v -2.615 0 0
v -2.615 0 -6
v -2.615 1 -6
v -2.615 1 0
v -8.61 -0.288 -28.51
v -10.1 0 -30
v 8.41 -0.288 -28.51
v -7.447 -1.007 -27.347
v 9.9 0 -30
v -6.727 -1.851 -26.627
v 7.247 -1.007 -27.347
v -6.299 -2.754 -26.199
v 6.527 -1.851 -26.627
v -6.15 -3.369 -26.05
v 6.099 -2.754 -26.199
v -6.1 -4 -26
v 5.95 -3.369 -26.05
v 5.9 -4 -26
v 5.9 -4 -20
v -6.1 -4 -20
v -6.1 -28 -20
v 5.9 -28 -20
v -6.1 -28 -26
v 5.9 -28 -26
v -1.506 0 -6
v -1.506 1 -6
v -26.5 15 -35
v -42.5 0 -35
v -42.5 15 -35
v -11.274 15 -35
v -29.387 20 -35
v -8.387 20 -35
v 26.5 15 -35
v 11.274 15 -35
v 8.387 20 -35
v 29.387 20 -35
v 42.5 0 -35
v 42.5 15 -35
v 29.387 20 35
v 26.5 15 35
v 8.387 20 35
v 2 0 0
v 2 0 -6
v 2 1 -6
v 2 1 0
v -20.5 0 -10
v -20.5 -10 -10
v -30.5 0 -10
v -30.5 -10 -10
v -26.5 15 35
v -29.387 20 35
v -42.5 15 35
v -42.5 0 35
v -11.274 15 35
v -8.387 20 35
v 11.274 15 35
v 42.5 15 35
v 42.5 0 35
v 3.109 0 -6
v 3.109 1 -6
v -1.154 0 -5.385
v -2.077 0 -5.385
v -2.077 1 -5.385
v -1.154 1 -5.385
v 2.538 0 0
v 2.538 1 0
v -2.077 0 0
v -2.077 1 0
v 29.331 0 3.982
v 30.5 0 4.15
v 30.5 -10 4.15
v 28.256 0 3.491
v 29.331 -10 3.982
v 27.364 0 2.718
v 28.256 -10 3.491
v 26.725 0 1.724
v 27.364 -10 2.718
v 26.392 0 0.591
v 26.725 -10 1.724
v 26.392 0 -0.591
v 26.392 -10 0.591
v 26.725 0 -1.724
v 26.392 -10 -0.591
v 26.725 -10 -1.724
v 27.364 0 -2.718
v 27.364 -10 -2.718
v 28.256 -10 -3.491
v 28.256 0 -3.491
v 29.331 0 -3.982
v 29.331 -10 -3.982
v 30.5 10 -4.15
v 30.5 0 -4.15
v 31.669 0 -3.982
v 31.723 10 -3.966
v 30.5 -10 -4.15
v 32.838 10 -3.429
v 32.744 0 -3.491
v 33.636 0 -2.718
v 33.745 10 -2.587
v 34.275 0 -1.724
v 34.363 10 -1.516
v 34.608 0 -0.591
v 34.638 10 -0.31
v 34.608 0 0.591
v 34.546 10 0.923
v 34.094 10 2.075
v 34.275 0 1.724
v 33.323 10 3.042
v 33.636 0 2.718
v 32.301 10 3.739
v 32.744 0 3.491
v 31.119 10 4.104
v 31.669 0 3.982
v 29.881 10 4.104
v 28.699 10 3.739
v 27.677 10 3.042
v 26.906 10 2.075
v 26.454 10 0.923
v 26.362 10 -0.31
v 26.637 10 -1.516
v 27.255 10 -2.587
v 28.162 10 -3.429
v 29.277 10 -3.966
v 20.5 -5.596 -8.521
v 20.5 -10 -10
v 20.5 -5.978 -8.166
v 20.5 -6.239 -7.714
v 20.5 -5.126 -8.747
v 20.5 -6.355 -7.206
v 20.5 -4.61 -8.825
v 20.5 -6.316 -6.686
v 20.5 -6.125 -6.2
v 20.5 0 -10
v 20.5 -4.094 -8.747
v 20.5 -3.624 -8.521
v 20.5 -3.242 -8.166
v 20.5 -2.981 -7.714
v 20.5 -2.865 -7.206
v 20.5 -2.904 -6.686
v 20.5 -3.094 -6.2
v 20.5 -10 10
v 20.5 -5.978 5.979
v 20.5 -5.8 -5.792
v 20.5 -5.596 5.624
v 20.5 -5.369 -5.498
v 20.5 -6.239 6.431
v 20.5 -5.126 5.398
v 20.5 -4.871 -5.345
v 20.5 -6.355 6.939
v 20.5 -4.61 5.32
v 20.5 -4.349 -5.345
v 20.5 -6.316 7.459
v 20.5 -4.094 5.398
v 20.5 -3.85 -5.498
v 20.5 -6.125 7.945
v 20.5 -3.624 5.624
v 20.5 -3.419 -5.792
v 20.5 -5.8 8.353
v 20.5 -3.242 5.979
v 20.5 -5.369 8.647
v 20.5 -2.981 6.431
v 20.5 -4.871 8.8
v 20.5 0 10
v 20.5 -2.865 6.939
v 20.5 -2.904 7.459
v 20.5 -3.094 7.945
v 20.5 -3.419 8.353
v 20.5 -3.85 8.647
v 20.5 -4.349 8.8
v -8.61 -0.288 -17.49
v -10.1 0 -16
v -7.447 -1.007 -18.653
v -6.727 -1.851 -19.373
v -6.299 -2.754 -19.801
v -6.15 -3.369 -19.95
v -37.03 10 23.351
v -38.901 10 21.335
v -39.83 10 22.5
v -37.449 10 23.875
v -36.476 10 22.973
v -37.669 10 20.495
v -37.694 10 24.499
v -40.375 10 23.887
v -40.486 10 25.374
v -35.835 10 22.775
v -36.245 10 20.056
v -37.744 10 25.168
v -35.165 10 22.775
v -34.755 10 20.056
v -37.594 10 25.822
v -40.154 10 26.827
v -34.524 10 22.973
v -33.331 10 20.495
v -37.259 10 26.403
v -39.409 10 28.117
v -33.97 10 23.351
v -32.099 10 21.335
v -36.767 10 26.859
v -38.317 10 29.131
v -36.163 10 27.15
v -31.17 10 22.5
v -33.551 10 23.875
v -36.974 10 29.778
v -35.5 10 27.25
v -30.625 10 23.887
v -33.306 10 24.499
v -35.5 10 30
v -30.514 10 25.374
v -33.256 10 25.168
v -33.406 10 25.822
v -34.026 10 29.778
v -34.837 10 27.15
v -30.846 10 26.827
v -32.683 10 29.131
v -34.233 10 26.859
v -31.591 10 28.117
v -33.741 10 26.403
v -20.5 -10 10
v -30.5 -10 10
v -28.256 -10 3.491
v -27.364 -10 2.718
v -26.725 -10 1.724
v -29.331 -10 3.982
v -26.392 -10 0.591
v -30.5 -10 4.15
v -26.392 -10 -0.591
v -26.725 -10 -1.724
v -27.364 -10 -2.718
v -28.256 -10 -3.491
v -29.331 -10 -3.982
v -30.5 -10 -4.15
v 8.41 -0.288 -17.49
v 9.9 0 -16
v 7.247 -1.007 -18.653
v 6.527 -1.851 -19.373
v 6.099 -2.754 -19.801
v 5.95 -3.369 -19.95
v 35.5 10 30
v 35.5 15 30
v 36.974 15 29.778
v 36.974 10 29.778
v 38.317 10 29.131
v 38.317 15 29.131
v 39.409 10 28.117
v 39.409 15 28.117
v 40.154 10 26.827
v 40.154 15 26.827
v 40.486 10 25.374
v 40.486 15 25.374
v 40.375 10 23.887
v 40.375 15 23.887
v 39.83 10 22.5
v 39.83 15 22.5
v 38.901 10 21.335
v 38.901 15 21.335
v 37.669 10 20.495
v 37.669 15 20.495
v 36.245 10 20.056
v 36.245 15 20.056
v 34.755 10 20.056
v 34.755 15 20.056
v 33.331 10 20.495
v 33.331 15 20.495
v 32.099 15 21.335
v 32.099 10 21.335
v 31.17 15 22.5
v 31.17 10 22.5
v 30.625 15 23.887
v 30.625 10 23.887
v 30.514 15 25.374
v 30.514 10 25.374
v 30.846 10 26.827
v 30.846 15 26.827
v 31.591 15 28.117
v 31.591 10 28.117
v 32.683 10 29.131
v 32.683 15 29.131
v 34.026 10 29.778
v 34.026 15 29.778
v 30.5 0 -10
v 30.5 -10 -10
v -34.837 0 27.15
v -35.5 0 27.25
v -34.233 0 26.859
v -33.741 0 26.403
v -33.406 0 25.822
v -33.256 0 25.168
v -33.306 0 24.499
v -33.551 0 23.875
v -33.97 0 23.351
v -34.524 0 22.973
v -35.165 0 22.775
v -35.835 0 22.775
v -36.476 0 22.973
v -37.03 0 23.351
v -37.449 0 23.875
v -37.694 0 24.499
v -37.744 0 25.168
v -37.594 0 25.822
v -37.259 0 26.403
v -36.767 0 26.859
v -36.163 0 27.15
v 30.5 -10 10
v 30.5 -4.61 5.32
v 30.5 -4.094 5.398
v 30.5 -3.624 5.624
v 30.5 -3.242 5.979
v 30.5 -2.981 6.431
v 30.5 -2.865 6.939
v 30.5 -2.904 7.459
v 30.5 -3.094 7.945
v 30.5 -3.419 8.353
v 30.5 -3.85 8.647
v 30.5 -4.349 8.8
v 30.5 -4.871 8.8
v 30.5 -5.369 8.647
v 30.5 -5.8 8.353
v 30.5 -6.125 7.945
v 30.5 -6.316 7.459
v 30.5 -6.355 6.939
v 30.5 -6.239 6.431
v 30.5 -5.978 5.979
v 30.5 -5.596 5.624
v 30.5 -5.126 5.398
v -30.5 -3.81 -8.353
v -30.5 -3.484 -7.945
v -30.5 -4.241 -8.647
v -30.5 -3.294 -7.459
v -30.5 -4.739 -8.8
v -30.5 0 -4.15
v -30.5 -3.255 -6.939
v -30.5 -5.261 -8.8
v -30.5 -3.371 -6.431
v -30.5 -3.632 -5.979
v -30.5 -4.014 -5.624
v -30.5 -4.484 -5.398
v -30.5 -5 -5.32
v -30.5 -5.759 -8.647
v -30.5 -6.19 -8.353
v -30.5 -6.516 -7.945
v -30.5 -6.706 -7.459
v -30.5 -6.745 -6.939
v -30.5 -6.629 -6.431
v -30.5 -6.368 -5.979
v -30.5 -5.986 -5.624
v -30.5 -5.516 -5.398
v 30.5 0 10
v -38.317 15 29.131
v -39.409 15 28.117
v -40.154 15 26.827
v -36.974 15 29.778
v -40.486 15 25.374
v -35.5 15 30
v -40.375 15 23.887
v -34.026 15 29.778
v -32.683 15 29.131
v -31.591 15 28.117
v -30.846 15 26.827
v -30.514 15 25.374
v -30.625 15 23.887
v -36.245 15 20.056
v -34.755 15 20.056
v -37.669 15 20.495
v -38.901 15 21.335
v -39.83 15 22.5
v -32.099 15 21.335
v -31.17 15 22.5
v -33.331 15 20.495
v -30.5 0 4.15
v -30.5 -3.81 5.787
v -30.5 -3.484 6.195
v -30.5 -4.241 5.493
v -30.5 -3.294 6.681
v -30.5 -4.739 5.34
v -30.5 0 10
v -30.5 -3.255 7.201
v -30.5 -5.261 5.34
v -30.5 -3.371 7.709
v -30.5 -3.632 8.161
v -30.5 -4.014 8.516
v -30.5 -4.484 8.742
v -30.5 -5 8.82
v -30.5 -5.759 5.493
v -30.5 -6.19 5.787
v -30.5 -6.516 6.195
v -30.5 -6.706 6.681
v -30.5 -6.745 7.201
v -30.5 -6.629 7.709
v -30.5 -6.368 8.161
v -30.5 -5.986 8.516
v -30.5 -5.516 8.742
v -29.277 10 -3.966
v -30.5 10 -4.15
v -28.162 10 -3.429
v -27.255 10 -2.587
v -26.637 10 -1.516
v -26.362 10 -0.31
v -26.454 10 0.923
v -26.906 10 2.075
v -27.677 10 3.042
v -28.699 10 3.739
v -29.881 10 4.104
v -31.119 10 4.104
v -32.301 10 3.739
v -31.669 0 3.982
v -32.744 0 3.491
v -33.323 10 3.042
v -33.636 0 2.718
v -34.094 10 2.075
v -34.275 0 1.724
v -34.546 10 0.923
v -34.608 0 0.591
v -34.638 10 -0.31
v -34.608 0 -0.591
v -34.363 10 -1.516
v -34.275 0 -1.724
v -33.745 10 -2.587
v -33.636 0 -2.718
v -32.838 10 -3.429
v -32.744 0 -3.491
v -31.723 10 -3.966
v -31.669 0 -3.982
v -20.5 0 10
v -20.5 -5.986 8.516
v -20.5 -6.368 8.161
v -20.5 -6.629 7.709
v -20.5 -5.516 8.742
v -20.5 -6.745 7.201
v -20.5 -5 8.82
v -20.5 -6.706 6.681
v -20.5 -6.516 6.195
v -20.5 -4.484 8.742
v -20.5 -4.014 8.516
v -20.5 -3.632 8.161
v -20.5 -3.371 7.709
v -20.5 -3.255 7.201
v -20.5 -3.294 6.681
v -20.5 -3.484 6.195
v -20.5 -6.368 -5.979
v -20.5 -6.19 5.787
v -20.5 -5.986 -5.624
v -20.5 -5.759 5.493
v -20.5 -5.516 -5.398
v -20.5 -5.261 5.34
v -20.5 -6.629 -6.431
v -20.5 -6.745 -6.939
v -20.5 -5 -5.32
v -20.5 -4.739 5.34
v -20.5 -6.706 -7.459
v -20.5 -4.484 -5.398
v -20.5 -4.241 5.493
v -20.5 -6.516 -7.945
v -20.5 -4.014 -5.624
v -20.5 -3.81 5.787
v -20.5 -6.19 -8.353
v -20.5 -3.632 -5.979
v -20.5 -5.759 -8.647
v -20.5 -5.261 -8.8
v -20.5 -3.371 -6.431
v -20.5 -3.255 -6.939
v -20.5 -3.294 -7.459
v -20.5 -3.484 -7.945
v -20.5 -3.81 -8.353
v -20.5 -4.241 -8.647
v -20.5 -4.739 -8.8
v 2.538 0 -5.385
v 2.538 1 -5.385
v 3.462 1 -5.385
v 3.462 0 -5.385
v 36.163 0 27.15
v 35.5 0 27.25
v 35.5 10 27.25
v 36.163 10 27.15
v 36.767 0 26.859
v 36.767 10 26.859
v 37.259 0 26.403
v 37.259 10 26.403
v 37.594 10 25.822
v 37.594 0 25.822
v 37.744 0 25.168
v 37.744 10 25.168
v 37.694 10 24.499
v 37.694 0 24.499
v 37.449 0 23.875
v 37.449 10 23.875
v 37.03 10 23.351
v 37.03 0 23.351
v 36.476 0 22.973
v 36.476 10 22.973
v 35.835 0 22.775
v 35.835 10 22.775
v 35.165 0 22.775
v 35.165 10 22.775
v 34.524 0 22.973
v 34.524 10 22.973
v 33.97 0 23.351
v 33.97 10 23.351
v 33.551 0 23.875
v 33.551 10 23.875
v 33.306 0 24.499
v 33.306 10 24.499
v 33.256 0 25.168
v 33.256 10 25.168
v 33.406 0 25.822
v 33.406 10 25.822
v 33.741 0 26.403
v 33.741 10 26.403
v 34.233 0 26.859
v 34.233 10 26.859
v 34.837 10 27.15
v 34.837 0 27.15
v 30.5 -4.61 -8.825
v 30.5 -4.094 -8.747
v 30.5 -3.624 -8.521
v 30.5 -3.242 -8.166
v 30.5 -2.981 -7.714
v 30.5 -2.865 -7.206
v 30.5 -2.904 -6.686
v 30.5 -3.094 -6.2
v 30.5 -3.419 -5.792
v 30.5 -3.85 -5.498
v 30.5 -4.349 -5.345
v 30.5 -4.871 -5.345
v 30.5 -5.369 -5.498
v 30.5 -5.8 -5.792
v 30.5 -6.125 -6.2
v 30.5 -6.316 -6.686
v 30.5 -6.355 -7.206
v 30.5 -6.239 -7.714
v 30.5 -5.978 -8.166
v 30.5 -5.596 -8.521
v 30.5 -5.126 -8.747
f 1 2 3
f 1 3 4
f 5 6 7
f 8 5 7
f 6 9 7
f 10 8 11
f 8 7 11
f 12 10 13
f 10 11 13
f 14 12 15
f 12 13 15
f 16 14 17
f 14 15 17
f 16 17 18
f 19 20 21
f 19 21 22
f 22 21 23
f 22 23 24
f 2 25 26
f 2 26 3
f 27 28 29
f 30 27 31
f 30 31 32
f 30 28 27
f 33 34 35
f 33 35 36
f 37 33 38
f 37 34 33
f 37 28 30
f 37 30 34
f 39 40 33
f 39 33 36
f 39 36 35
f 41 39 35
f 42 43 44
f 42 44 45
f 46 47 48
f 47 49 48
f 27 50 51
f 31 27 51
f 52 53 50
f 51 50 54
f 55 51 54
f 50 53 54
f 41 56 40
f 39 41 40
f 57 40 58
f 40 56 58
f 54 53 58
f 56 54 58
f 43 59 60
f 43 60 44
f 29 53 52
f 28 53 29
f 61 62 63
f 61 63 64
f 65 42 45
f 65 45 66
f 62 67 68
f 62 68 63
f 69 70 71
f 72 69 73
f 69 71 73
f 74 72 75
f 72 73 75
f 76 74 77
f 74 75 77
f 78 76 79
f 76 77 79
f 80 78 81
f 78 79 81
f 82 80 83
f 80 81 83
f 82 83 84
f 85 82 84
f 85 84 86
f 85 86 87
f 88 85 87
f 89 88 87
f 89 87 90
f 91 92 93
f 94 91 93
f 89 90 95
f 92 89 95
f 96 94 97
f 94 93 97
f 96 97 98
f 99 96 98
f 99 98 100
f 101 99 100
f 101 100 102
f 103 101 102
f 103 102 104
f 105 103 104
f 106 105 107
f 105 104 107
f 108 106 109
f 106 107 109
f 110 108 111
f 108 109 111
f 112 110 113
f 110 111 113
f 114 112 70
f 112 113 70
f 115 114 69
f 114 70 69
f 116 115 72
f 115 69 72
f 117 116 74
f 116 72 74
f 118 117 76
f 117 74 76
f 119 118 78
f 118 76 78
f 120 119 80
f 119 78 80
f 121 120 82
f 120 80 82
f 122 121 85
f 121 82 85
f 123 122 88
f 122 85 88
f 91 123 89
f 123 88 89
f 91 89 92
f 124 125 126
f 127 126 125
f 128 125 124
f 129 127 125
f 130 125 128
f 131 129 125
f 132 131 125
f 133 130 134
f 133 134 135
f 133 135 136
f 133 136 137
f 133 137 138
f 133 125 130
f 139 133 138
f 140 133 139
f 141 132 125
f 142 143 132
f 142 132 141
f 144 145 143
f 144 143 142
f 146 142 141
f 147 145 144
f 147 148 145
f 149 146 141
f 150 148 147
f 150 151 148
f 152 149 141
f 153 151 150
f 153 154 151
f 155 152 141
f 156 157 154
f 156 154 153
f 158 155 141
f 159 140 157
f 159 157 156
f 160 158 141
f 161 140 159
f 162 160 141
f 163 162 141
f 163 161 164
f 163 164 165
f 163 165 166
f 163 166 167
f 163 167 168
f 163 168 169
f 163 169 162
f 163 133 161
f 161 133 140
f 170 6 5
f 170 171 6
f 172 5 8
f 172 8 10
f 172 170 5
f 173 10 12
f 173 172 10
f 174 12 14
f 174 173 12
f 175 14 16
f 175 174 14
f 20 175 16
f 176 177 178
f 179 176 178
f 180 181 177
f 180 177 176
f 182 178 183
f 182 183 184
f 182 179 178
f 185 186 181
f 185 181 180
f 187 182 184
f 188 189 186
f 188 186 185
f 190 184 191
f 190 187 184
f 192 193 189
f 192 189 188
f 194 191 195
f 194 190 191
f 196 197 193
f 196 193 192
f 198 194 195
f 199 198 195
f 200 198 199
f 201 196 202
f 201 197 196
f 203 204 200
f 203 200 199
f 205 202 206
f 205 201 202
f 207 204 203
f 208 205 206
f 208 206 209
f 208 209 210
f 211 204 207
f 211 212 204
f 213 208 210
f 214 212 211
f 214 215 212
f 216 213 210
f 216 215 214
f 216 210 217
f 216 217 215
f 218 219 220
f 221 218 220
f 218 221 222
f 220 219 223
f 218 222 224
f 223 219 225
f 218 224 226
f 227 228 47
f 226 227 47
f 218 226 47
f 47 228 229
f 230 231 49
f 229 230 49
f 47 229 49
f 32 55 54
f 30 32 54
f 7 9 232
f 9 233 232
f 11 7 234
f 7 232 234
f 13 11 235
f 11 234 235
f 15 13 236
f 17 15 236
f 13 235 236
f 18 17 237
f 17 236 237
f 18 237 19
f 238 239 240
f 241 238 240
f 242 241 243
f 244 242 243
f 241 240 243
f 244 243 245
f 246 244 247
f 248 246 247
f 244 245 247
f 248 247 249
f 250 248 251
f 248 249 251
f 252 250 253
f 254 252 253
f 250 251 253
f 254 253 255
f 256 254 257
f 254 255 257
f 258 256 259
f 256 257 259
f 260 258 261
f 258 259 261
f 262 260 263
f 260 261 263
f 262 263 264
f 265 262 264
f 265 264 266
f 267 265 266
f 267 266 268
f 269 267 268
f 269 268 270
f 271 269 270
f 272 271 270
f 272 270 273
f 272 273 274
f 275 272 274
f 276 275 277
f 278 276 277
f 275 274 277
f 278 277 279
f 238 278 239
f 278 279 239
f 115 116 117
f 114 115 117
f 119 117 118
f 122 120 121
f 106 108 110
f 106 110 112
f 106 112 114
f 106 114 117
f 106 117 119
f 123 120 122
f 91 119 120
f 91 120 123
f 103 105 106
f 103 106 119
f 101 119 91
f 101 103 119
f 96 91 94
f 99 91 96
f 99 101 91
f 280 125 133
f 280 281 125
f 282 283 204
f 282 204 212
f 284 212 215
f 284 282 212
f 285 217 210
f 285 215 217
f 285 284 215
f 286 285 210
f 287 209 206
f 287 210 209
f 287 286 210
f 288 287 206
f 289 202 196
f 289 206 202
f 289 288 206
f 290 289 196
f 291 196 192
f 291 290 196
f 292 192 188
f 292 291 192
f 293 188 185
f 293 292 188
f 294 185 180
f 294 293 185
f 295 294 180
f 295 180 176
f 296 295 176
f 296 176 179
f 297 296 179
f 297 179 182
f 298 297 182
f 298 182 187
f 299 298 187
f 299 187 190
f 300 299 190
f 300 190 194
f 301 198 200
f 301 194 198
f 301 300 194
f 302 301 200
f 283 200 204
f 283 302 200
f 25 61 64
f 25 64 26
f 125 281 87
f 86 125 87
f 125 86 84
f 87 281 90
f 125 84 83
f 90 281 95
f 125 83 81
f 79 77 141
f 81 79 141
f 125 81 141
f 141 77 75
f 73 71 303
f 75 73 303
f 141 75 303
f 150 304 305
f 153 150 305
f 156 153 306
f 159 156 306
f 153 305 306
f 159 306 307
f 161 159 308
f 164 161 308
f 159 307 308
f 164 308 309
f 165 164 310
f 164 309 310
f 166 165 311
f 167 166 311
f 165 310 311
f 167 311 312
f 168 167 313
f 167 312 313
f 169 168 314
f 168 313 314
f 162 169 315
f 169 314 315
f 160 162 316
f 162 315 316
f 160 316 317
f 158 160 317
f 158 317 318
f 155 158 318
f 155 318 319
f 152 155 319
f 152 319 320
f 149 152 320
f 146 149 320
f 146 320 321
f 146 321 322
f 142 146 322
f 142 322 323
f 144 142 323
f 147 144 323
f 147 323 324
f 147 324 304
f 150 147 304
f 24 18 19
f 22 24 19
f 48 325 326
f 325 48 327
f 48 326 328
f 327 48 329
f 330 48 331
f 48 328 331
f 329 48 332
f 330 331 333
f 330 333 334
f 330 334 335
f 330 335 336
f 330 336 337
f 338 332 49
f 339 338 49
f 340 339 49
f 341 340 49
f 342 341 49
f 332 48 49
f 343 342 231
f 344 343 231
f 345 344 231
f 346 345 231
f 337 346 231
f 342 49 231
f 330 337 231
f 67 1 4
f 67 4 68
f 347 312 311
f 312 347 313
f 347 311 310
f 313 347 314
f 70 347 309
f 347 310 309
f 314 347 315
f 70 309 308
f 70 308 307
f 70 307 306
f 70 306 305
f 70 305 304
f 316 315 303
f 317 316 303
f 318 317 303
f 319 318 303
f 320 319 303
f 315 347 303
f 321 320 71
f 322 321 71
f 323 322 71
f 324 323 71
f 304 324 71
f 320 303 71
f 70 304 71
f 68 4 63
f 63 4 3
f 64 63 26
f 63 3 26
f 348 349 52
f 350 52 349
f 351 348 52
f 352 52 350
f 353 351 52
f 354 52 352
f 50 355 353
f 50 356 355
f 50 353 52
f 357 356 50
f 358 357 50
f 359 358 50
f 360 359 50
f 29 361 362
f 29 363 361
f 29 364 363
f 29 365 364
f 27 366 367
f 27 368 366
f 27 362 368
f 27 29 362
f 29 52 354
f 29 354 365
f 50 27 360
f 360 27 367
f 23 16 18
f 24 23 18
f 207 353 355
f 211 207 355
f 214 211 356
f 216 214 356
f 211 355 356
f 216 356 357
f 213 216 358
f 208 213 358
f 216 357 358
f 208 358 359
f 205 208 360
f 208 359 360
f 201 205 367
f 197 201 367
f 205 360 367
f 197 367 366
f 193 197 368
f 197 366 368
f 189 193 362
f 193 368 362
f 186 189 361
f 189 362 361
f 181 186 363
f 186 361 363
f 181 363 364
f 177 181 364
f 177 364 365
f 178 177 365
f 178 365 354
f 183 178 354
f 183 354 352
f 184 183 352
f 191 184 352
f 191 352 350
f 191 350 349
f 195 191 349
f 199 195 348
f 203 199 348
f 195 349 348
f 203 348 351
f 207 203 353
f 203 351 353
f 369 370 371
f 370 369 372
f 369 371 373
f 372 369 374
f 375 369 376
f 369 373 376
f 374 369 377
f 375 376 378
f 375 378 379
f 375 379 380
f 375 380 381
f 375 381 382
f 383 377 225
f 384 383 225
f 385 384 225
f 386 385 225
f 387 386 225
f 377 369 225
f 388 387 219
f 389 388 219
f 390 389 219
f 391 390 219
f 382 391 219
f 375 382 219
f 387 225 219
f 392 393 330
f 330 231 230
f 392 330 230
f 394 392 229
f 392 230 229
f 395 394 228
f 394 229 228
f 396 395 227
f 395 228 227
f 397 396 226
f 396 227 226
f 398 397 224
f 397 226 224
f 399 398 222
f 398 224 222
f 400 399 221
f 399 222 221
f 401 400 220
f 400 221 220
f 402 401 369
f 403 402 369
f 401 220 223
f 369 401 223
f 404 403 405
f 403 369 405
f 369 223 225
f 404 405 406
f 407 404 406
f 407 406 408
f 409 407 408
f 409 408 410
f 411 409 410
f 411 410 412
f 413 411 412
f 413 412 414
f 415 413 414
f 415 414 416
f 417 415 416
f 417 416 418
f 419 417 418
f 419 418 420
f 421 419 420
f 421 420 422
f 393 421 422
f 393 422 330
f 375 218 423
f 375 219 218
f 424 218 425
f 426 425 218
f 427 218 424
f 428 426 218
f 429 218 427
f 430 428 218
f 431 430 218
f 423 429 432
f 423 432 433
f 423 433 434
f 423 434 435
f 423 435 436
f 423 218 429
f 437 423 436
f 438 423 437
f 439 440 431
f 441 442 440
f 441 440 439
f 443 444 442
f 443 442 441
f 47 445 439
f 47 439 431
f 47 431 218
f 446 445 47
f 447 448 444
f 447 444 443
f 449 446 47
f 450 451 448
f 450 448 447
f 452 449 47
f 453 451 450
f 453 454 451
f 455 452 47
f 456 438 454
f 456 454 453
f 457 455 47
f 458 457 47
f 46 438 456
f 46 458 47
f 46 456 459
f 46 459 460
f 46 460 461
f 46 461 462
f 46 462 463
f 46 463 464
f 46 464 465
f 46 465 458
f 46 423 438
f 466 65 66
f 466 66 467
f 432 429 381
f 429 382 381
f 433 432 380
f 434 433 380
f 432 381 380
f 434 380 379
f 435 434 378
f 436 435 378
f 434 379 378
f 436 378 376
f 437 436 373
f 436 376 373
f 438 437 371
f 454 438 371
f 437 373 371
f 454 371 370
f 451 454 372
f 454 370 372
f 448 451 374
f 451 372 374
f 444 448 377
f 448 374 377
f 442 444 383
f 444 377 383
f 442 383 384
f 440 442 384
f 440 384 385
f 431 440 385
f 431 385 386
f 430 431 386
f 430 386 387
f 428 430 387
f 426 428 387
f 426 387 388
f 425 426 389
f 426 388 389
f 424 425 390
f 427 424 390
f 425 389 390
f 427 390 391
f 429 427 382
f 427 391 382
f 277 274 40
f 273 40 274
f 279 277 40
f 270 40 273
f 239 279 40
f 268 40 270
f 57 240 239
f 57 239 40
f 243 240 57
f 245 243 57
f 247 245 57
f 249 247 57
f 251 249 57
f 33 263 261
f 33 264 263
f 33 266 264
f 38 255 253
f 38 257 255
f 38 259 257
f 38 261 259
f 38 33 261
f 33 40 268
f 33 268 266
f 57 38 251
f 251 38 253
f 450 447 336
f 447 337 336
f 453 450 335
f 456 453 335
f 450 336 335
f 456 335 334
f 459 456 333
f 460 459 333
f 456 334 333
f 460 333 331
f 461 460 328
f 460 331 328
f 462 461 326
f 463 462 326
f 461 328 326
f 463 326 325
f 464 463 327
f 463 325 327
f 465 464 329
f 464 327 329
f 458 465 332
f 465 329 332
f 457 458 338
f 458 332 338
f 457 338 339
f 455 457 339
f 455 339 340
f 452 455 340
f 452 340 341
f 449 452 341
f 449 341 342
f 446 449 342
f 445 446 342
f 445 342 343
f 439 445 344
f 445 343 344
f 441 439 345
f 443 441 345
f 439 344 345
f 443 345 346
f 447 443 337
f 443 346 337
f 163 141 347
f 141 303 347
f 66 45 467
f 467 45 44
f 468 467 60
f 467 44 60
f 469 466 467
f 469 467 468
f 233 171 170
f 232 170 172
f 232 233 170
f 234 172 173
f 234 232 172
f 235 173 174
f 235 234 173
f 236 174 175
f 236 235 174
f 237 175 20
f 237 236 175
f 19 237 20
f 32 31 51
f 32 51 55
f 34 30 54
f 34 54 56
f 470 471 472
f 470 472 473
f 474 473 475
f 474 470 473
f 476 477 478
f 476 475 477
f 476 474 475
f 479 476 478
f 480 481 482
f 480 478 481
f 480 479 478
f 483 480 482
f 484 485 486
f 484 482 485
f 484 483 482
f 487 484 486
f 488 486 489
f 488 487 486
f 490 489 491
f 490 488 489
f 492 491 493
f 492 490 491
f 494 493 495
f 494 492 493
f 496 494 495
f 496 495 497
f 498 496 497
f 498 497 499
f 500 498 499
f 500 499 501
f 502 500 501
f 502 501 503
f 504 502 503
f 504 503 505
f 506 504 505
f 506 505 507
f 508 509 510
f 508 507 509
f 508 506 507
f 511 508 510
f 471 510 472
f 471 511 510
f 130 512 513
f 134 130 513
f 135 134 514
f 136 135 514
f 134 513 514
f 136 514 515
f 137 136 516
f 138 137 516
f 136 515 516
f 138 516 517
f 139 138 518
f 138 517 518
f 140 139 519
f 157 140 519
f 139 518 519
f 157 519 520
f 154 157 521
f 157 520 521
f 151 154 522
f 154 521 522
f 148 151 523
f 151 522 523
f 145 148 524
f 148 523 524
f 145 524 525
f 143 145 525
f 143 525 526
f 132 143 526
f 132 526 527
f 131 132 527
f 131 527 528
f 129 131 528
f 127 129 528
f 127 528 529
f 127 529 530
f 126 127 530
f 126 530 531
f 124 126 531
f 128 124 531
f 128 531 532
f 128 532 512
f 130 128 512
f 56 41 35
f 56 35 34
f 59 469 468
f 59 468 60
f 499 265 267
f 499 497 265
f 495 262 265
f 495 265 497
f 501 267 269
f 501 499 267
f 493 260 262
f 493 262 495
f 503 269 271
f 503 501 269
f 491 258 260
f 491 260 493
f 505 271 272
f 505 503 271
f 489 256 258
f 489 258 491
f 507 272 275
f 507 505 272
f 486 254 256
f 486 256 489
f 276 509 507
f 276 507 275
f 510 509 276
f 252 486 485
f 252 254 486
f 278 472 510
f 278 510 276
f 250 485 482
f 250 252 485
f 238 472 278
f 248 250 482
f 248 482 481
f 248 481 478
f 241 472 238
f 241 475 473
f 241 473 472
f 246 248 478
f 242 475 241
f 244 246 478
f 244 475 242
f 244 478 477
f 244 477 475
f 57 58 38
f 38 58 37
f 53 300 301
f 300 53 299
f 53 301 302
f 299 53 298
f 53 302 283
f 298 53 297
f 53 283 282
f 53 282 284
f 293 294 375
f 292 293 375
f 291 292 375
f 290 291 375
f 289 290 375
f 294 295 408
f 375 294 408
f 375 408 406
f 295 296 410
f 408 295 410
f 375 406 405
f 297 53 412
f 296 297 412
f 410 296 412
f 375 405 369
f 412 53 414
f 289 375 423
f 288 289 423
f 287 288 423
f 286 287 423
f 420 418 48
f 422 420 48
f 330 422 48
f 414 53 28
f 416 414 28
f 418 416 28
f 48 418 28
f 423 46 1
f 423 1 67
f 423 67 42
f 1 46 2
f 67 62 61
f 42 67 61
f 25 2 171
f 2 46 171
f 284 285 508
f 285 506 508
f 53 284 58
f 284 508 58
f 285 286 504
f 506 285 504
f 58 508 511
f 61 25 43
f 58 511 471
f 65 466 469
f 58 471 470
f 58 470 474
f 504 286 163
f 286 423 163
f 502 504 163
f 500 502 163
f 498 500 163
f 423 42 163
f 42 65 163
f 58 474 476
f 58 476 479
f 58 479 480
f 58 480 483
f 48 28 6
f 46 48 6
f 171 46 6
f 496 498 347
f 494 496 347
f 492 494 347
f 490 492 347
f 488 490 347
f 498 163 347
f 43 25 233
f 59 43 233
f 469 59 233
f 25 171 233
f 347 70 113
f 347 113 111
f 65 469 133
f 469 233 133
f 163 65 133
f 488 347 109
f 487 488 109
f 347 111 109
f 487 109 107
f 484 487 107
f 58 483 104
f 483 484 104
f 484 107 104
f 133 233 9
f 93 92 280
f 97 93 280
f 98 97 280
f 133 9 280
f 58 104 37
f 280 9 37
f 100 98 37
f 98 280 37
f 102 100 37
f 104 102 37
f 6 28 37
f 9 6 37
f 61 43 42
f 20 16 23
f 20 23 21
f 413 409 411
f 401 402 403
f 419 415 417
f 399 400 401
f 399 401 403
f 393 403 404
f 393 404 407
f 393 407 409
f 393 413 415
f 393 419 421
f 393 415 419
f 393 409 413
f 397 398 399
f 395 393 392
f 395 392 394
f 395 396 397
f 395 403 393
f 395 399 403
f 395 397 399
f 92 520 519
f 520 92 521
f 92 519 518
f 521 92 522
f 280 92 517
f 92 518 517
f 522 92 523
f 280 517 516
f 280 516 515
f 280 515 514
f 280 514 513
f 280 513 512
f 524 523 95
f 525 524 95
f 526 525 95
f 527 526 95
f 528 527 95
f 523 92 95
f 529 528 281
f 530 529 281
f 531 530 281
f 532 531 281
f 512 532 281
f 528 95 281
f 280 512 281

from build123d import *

# Parameters (mm, degrees)
CROQUIS1_W                  = 85
CROQUIS1_H                  = 70
SALIENTE_EXTRUIR1_DEPTH     = 15
CROQUIS3_R                  = 4.15
CORTAR_EXTRUIR1_DEPTH       = 10
CORTAR_EXTRUIR2_DEPTH       = 1
SALIENTE_EXTRUIR4_START     = 10
SALIENTE_EXTRUIR4_DEPTH     = 10
CROQUIS9_W                  = 5.85
CROQUIS9_H                  = 10
SALIENTE_EXTRUIR5_DEPTH     = 9
CROQUIS10_W                 = 20
CROQUIS10_H                 = 10
SALIENTE_EXTRUIR6_DEPTH     = 1
CORTAR_EXTRUIR4_REACH       = 84.335
CROQUIS8_R                  = 1.75
CROQUIS12_W                 = 5.85
CROQUIS12_H                 = 10
CROQUIS12_R                 = 1.75
SALIENTE_EXTRUIR7_DEPTH     = 9
CROQUIS13_W                 = 20
CROQUIS13_H                 = 10
SALIENTE_EXTRUIR8_DEPTH     = 1
CROQUIS14_R                 = 1.75
CORTAR_EXTRUIR5_DEPTH       = 11
SALIENTE_EXTRUIR10_DEPTH    = 70
CROQUIS23_R                 = 5
CORTAR_EXTRUIR9_DEPTH       = 5
CROQUIS22_R                 = 5
CORTAR_EXTRUIR10_DEPTH      = 5
CORTAR_EXTRUIR11_DEPTH      = 59.576872569
CORTAR_EXTRUIR11_DEPTH_BACK = 59.576872569
CROQUIS24_R                 = 2.25
CROQUIS25_W                 = 12
CROQUIS25_H                 = 6
SALIENTE_EXTRUIR11_DEPTH    = 28
REDONDEO1_R                 = 4


with BuildPart() as part:
    # Croquis1 → Saliente-Extruir1 (new body)
    with BuildSketch(Plane(origin=(0, 0, 0), x_dir=(1, 0, 0), z_dir=(0, 1, 0))):
        Rectangle(CROQUIS1_W, CROQUIS1_H)
    extrude(amount=SALIENTE_EXTRUIR1_DEPTH)

    # Croquis3 → Cortar-Extruir1 (cut)
    with BuildSketch(Plane.XZ):
        with Locations(Location((-30.5, 0, 0), (0, 0, 270))):
            Circle(CROQUIS3_R)
        with Locations(Location((30.5, 0, 0), (0, 0, 270))):
            Circle(CROQUIS3_R)
    extrude(amount=-CORTAR_EXTRUIR1_DEPTH, mode=Mode.SUBTRACT)

    # Croquis4 → Cortar-Extruir2 (cut)
    with BuildSketch(Plane(origin=(0, 0, 0), x_dir=(-1, 0, 0), z_dir=(0, -1, 0))):
        Polygon((-3.109375, 6), (-2, 6), (-2, 0), (-2.538461538, 0), (-2.538461538, 5.384615385), (-3.461538462, 5.384615385), align=None)
        Polygon((1.506009615, 6), (2.615384615, 6), (2.615384615, 0), (2.076923077, 0), (2.076923077, 5.384615385), (1.153846154, 5.384615385), align=None)
    extrude(amount=-CORTAR_EXTRUIR2_DEPTH, mode=Mode.SUBTRACT)

    # Croquis5 → Saliente-Extruir4 (add)
    with BuildSketch(Plane.XZ.offset(SALIENTE_EXTRUIR4_START)):
        with BuildLine():
            Line((30.5, -4.15), (30.5, -10))
            ThreePointArc((30.5, -10), (20.5, 0), (30.5, 10))
            Line((30.5, 10), (30.5, 4.15))
            ThreePointArc((30.5, 4.15), (26.35, 0), (30.5, -4.15))
        make_face()
        with BuildLine():
            Line((-30.5, -10), (-30.5, -4.15))
            ThreePointArc((-30.5, -4.15), (-26.35, 0), (-30.5, 4.15))
            Line((-30.5, 4.15), (-30.5, 10))
            ThreePointArc((-30.5, 10), (-20.5, 0), (-30.5, -10))
        make_face()
    extrude(amount=-SALIENTE_EXTRUIR4_DEPTH)

    # Croquis9 → Saliente-Extruir5 (add)
    with BuildSketch(Plane(origin=(30.5, 0, 0), x_dir=(0, 0, -1), z_dir=(1, 0, 0))):
        with Locations((7.075, -5)):
            Rectangle(CROQUIS9_W, CROQUIS9_H)
        with Locations((-7.075, -5)):
            Rectangle(CROQUIS9_W, CROQUIS9_H)
    extrude(amount=-SALIENTE_EXTRUIR5_DEPTH)

    # Croquis10 → Saliente-Extruir6 (add)
    with BuildSketch(Plane.ZY.offset(-21.5)):
        with Locations((0, -5)):
            Rectangle(CROQUIS10_W, CROQUIS10_H)
    extrude(amount=SALIENTE_EXTRUIR6_DEPTH)

    # Croquis8 → Cortar-Extruir4 (cut, up to next)
    with BuildSketch(Plane(origin=(30.5, 0, 0), x_dir=(0, 0, -1), z_dir=(1, 0, 0)), mode=Mode.PRIVATE) as cortar_extruir4_sk1:
        with Locations((7.075, -4.609756337)):
            Circle(CROQUIS8_R)
    cortar_extruir4_tool1 = extrude(cortar_extruir4_sk1.sketch, amount=-CORTAR_EXTRUIR4_REACH, mode=Mode.PRIVATE) & part.part
    # Croquis8 → Cortar-Extruir4 (cut, up to next)
    with BuildSketch(Plane(origin=(30.5, 0, 0), x_dir=(0, 0, -1), z_dir=(1, 0, 0)), mode=Mode.PRIVATE) as cortar_extruir4_sk2:
        with Locations((-7.07, -4.609756337)):
            Circle(CROQUIS8_R)
    cortar_extruir4_tool2 = extrude(cortar_extruir4_sk2.sketch, amount=-CORTAR_EXTRUIR4_REACH, mode=Mode.PRIVATE) & part.part
    add(cortar_extruir4_tool1.solids().sort_by_distance((30.5, -4.609756, -7.075))[0], mode=Mode.SUBTRACT)
    add(cortar_extruir4_tool2.solids().sort_by_distance((30.5, -4.609756, 7.07))[0], mode=Mode.SUBTRACT)

    # Croquis12 → Saliente-Extruir7 (add)
    # profile 1 of 2: a face of its own
    with BuildSketch(Plane.ZY.offset(30.5)):
        with Locations((7.075, -5)):
            Rectangle(CROQUIS12_W, CROQUIS12_H)
        with Locations((7.07, -5)):
            Circle(CROQUIS12_R, mode=Mode.SUBTRACT)
    # profile 2 of 2: a face of its own
    with BuildSketch(Plane.ZY.offset(30.5)):
        with Locations((-7.075, -5)):
            Rectangle(CROQUIS12_W, CROQUIS12_H)
        with Locations((-7.07, -5)):
            Circle(CROQUIS12_R, mode=Mode.SUBTRACT)
    extrude(amount=-SALIENTE_EXTRUIR7_DEPTH)

    # Croquis13 → Saliente-Extruir8 (add)
    with BuildSketch(Plane(origin=(-21.5, 0, 0), x_dir=(0, 0, -1), z_dir=(1, 0, 0))):
        with Locations((0, -5)):
            Rectangle(CROQUIS13_W, CROQUIS13_H)
    extrude(amount=SALIENTE_EXTRUIR8_DEPTH)

    # Croquis14 → Cortar-Extruir5 (cut)
    with BuildSketch(Plane.ZY.offset(30.5)):
        with Locations((7.07, -5)):
            Circle(CROQUIS14_R)
        with Locations((-7.07, -5)):
            Circle(CROQUIS14_R)
    extrude(amount=-CORTAR_EXTRUIR5_DEPTH, mode=Mode.SUBTRACT)

    # Croquis15 → Saliente-Extruir10 (add, through all)
    with BuildSketch(Plane(origin=(0, 0, -35), x_dir=(-1, 0, 0), z_dir=(0, 0, -1))):
        Polygon((-26.5, 15), (-29.386751346, 20), (-8.386751346, 20), (-11.273502692, 15), align=None)
        Polygon((8.386751346, 20), (11.273502692, 15), (26.5, 15), (29.386751346, 20), align=None)
    extrude(amount=-SALIENTE_EXTRUIR10_DEPTH)

    # Croquis23 → Cortar-Extruir9 (cut)
    with BuildSketch(Plane(origin=(0, 15, 0), x_dir=(1, 0, 0), z_dir=(0, 1, 0))):
        with Locations(Location((-35.5, -25, 0), (0, 0, 270))):
            Circle(CROQUIS23_R)
    extrude(amount=-CORTAR_EXTRUIR9_DEPTH, mode=Mode.SUBTRACT)

    # Croquis22 → Cortar-Extruir10 (cut)
    with BuildSketch(Plane(origin=(0, 15, 0), x_dir=(1, 0, 0), z_dir=(0, 1, 0))):
        with Locations(Location((35.5, -25, 0), (0, 0, 270))):
            Circle(CROQUIS22_R)
    extrude(amount=-CORTAR_EXTRUIR10_DEPTH, mode=Mode.SUBTRACT)

    # Croquis24 → Cortar-Extruir11 (cut, two sides: drawn at the far end of the back side and taken through both)
    with BuildSketch(Plane(origin=(0, 10, 0), x_dir=(1, 0, 0), z_dir=(0, 1, 0)).offset(-CORTAR_EXTRUIR11_DEPTH_BACK)):
        with Locations(Location((-35.5, -25, 0), (0, 0, 270))):
            Circle(CROQUIS24_R)
        with Locations(Location((35.5, -25, 0), (0, 0, 270))):
            Circle(CROQUIS24_R)
    extrude(amount=CORTAR_EXTRUIR11_DEPTH + CORTAR_EXTRUIR11_DEPTH_BACK, mode=Mode.SUBTRACT)

    # Croquis25 → Saliente-Extruir11 (add)
    with BuildSketch(Plane.XZ):
        with Locations((-0.1, -23)):
            Rectangle(CROQUIS25_W, CROQUIS25_H)
    extrude(amount=SALIENTE_EXTRUIR11_DEPTH)

    # Redondeo1
    redondeo1_edges = [part.edges().sort_by_distance(p)[0] for p in [
        (5.9, 0, -23),
        (-0.1, 0, -20),
        (-6.1, 0, -23),
        (-0.1, 0, -26),
    ]]
    fillet(redondeo1_edges, radius=REDONDEO1_R)


solid = part.part
